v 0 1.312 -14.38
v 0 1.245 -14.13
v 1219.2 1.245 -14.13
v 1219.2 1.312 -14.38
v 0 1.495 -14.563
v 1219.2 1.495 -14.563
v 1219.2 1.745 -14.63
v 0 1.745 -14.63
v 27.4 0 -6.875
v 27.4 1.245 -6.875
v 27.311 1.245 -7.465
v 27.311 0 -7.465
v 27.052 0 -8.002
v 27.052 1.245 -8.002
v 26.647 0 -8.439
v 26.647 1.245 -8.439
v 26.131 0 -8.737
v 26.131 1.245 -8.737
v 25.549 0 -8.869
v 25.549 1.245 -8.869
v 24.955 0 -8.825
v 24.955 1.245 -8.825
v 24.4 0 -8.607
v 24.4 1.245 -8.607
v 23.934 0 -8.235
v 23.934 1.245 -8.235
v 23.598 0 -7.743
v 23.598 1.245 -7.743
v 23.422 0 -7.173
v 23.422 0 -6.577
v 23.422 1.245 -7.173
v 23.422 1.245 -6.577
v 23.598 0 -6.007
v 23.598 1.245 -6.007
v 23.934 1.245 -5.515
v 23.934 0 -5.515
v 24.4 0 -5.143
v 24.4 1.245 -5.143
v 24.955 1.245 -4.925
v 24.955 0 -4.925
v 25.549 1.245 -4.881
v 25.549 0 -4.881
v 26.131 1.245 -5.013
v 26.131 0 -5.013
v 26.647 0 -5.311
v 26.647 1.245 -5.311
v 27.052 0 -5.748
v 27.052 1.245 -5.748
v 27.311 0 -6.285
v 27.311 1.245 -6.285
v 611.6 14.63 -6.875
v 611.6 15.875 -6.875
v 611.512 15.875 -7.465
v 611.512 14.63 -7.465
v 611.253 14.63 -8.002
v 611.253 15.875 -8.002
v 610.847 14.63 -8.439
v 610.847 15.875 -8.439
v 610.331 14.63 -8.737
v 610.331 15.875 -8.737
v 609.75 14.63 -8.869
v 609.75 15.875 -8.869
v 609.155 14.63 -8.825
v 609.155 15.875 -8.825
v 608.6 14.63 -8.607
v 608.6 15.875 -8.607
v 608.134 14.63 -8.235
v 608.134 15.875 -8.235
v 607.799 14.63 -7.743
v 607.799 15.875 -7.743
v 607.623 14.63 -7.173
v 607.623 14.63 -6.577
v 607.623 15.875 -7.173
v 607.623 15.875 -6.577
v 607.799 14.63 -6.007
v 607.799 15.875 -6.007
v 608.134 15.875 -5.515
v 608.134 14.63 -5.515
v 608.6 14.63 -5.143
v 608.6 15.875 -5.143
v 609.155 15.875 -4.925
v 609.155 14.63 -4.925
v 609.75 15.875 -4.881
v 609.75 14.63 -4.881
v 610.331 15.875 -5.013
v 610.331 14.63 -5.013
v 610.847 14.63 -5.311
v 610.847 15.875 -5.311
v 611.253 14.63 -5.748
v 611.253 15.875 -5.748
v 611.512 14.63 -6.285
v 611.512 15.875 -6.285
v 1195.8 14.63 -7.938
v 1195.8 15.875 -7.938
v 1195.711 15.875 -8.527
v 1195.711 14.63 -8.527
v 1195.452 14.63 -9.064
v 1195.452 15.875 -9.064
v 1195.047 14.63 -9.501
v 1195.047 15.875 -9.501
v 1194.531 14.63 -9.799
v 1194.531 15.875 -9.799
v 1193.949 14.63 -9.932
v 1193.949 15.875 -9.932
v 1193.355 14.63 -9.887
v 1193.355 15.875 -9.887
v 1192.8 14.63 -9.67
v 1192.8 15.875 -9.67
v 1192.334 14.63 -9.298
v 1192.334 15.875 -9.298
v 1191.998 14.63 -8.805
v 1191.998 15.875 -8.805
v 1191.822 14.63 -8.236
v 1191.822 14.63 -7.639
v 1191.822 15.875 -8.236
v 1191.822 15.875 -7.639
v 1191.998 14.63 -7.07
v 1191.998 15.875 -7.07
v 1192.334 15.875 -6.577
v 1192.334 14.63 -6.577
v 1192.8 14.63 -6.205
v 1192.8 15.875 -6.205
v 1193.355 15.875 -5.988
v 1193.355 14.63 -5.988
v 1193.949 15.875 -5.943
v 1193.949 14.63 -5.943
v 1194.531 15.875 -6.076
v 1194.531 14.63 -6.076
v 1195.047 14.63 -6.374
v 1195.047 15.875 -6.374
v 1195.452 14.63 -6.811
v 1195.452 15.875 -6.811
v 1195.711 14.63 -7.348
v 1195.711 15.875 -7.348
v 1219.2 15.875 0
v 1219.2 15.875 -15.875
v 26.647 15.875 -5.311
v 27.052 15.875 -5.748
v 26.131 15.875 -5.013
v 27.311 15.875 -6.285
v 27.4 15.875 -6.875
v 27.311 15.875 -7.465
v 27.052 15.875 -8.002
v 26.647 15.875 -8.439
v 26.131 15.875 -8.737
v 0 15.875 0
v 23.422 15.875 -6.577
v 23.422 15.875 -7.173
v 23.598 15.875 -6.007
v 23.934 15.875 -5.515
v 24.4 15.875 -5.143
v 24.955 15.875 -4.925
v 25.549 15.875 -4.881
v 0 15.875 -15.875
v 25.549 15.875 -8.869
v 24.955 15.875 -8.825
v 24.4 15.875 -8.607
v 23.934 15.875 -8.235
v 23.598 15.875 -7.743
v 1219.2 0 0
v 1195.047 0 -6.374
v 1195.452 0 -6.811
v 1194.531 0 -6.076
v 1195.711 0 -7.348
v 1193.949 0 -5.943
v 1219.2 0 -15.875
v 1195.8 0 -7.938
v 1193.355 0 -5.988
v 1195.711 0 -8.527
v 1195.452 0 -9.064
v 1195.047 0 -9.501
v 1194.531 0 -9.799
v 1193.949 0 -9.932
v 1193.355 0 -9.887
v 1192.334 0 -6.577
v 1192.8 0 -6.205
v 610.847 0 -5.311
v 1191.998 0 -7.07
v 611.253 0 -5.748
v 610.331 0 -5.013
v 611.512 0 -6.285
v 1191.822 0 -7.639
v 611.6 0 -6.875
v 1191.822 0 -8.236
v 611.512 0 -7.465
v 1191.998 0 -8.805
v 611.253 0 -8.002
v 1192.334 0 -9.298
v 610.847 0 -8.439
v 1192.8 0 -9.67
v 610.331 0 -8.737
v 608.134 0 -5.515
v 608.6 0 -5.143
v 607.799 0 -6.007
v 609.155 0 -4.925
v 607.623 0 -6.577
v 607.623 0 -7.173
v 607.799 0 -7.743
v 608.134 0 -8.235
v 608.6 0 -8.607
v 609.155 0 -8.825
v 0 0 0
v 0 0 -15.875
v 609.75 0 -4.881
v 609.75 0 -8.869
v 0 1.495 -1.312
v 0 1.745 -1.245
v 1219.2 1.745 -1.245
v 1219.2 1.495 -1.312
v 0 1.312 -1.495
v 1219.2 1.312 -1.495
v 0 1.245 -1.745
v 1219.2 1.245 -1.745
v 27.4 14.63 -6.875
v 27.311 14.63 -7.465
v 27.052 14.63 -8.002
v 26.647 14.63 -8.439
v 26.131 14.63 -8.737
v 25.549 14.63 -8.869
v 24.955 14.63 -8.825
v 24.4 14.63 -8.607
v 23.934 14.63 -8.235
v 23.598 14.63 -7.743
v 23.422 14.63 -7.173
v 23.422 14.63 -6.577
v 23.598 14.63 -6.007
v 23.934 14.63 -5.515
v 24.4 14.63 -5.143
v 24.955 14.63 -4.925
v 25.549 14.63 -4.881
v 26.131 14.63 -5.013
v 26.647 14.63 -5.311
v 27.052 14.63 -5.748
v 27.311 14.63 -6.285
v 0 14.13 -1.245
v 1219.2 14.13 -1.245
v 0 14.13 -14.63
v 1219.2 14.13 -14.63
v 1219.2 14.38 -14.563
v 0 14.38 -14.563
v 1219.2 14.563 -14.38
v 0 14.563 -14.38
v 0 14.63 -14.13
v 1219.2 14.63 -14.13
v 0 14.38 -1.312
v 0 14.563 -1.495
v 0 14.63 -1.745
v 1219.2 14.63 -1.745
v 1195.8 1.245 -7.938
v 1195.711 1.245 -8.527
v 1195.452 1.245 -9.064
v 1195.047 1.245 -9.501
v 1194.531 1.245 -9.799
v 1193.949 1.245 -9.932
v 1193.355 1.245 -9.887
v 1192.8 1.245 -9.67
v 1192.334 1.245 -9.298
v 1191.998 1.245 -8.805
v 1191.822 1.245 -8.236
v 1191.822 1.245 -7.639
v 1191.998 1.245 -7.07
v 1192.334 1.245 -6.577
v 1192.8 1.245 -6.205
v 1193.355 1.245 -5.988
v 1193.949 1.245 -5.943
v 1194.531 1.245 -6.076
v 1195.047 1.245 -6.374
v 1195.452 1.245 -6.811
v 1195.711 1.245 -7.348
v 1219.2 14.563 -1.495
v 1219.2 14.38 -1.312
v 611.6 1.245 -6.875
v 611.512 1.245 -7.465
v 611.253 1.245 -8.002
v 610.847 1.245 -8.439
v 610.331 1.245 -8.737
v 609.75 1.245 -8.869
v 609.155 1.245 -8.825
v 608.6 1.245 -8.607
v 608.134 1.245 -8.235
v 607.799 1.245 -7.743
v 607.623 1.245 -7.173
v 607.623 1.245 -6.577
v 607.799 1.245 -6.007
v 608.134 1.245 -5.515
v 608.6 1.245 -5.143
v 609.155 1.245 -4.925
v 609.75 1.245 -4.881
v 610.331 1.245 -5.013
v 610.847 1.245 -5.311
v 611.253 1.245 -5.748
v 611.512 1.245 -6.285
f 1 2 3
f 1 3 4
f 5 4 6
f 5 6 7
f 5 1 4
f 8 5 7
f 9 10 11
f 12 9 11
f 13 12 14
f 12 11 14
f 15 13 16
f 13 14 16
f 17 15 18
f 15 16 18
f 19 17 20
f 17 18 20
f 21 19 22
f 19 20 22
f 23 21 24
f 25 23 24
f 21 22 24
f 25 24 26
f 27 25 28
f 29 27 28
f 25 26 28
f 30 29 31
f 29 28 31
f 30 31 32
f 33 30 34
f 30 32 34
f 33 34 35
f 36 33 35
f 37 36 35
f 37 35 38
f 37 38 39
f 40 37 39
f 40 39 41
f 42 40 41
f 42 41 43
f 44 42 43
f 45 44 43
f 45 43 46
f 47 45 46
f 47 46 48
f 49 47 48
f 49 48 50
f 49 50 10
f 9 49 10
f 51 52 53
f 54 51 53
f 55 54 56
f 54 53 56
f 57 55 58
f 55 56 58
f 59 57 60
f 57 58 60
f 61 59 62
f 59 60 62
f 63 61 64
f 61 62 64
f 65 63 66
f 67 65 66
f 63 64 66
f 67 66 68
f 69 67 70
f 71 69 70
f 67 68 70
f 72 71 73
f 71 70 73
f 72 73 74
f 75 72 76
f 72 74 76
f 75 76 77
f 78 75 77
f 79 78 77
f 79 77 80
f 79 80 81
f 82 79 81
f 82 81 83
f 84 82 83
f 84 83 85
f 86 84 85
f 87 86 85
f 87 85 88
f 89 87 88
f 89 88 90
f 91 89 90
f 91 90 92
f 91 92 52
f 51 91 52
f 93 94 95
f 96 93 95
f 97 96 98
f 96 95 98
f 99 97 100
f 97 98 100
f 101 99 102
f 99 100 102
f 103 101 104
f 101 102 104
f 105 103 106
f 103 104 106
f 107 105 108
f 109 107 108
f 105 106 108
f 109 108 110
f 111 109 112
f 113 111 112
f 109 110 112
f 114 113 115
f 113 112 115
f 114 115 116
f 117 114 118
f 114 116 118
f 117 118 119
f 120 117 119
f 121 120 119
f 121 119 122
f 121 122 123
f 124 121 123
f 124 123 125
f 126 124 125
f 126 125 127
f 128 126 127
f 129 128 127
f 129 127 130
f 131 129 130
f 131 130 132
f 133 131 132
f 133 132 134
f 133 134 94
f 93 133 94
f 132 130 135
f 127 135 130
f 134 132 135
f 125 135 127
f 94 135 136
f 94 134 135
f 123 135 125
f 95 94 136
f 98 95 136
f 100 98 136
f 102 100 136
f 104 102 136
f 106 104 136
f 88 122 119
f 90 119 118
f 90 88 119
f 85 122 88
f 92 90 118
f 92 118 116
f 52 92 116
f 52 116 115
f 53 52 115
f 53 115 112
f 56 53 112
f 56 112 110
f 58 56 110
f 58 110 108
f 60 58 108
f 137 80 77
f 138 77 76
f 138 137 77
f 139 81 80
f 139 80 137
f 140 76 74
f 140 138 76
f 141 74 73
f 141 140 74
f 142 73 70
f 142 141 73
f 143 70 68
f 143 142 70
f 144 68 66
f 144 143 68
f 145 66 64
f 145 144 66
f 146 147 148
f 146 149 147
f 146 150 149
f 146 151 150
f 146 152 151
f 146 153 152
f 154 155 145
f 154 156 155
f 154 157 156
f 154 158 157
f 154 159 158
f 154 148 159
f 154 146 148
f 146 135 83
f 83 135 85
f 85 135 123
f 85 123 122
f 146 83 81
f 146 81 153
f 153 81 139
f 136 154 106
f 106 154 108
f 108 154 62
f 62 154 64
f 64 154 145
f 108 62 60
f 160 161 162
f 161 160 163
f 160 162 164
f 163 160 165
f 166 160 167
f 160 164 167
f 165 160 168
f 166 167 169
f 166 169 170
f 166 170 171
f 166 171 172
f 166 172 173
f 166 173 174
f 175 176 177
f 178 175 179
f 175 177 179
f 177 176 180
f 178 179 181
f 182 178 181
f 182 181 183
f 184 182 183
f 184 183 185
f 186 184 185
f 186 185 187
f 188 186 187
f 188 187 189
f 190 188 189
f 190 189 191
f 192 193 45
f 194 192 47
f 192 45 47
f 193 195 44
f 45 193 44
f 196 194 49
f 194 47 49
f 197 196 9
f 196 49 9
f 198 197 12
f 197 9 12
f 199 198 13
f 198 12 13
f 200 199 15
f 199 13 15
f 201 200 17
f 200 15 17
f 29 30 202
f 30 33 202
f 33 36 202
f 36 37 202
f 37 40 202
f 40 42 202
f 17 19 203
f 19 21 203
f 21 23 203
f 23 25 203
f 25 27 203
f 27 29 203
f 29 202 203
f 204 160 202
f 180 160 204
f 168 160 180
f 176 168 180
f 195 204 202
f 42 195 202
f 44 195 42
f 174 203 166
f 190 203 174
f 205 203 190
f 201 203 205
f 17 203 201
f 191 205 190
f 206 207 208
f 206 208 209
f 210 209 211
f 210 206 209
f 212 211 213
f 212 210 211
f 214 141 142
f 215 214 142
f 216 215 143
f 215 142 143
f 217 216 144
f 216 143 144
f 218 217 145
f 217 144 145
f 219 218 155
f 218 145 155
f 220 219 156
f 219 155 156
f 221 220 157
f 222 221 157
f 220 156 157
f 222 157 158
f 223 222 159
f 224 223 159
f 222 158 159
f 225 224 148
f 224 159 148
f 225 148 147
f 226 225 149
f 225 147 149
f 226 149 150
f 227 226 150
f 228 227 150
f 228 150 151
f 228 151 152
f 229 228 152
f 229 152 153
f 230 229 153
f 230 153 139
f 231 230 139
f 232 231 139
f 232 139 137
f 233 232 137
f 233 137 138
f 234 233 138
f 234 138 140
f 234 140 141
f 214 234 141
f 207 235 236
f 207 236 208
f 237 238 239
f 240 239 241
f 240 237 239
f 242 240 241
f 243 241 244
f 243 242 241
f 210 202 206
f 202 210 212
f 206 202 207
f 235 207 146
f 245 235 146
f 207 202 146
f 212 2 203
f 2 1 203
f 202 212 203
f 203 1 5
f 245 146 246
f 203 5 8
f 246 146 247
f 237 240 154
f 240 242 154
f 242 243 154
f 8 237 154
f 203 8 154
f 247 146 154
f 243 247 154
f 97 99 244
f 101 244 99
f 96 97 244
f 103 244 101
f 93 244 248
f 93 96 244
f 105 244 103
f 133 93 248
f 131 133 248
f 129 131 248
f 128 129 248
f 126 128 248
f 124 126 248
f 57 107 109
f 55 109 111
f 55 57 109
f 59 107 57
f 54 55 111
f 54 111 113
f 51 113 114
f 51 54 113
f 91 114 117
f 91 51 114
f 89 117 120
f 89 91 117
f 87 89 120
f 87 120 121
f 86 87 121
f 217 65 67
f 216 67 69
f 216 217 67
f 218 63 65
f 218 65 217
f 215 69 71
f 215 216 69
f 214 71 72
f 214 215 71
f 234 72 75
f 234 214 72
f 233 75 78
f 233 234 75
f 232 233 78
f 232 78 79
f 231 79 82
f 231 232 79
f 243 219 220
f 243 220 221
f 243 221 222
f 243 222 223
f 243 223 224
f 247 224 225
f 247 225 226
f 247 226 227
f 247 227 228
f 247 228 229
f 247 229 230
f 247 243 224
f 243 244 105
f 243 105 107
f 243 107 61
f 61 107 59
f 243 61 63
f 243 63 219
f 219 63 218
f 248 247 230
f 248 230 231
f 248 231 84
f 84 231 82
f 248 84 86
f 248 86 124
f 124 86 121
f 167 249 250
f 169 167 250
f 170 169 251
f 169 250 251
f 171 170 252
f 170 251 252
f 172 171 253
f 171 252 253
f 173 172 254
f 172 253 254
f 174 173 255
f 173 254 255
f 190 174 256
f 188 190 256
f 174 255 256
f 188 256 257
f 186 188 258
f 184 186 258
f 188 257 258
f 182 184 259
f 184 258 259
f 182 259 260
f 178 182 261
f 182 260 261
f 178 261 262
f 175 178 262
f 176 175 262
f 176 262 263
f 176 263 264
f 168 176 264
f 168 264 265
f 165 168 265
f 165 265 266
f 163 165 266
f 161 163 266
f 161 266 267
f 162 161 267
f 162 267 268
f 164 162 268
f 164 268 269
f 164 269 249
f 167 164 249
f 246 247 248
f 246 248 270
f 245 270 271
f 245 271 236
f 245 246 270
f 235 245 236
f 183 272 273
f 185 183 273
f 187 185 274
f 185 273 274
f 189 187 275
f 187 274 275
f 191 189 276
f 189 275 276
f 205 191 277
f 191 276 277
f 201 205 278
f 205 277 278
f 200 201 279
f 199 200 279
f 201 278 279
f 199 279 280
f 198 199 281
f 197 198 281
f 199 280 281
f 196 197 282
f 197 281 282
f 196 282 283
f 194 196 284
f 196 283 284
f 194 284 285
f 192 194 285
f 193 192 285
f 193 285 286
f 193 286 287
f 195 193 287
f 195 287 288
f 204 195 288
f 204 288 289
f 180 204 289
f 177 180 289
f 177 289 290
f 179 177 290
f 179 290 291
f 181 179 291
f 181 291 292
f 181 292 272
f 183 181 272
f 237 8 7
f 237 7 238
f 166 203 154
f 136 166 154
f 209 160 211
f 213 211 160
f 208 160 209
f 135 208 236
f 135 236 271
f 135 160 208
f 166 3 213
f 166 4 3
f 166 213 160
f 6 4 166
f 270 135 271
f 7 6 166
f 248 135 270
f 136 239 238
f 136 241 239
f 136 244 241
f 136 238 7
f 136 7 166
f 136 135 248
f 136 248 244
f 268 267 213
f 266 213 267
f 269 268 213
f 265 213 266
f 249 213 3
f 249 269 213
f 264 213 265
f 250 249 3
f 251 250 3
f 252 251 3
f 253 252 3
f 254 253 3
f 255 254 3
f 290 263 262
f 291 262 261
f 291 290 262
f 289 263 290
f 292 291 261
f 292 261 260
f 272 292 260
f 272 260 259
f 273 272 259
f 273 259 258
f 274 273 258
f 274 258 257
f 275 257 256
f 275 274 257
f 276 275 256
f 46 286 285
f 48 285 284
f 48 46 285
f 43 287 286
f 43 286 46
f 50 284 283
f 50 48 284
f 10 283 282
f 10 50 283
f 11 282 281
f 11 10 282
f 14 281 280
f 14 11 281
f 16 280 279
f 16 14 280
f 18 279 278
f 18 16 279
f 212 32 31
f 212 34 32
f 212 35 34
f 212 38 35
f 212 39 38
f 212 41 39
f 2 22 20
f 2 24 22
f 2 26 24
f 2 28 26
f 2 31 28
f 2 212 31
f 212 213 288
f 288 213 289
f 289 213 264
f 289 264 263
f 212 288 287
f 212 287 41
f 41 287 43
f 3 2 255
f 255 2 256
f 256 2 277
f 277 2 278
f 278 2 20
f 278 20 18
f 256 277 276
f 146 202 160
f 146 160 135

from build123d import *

# Parameters (mm, degrees)
SKETCH1_W           = 15.875
SKETCH1_H           = 15.875
BOSS_EXTRUDE1_DEPTH = 1219.2
SKETCH2_R           = 2
CUT_EXTRUDE1_DEPTH  = 16.875


with BuildPart() as part:
    # Sketch1 → Boss-Extrude1 (new body)
    with BuildSketch(Plane(origin=(0, 0, 0), x_dir=(0, 0, -1), z_dir=(1, 0, 0))):
        with Locations((7.9375, 7.9375)):
            Rectangle(SKETCH1_W, SKETCH1_H)
        with BuildLine():
            Line((1.7446, 1.2446), (14.1304, 1.2446))
            ThreePointArc((14.1304, 1.2446), (14.483953391, 1.391046609), (14.6304, 1.7446))
            Line((14.6304, 1.7446), (14.6304, 14.1304))
            ThreePointArc((14.6304, 14.1304), (14.483953391, 14.483953391), (14.1304, 14.6304))
            Line((14.1304, 14.6304), (1.7446, 14.6304))
            ThreePointArc((1.7446, 14.6304), (1.391046609, 14.483953391), (1.2446, 14.1304))
            Line((1.2446, 14.1304), (1.2446, 1.7446))
            ThreePointArc((1.2446, 1.7446), (1.391046609, 1.391046609), (1.7446, 1.2446))
        make_face(mode=Mode.SUBTRACT)
    extrude(amount=BOSS_EXTRUDE1_DEPTH)

    # Sketch2 → Cut-Extrude1 (cut, through all)
    with BuildSketch(Plane(origin=(0, 15.875, 0), x_dir=(1, 0, 0), z_dir=(0, 1, 0))):
        with Locations((609.600483099, 6.875)):
            Circle(SKETCH2_R)
        with Locations((25.4, 6.875)):
            Circle(SKETCH2_R)
        with Locations((1193.8, 7.9375)):
            Circle(SKETCH2_R)
    extrude(amount=-CUT_EXTRUDE1_DEPTH, mode=Mode.SUBTRACT)


solid = part.part
